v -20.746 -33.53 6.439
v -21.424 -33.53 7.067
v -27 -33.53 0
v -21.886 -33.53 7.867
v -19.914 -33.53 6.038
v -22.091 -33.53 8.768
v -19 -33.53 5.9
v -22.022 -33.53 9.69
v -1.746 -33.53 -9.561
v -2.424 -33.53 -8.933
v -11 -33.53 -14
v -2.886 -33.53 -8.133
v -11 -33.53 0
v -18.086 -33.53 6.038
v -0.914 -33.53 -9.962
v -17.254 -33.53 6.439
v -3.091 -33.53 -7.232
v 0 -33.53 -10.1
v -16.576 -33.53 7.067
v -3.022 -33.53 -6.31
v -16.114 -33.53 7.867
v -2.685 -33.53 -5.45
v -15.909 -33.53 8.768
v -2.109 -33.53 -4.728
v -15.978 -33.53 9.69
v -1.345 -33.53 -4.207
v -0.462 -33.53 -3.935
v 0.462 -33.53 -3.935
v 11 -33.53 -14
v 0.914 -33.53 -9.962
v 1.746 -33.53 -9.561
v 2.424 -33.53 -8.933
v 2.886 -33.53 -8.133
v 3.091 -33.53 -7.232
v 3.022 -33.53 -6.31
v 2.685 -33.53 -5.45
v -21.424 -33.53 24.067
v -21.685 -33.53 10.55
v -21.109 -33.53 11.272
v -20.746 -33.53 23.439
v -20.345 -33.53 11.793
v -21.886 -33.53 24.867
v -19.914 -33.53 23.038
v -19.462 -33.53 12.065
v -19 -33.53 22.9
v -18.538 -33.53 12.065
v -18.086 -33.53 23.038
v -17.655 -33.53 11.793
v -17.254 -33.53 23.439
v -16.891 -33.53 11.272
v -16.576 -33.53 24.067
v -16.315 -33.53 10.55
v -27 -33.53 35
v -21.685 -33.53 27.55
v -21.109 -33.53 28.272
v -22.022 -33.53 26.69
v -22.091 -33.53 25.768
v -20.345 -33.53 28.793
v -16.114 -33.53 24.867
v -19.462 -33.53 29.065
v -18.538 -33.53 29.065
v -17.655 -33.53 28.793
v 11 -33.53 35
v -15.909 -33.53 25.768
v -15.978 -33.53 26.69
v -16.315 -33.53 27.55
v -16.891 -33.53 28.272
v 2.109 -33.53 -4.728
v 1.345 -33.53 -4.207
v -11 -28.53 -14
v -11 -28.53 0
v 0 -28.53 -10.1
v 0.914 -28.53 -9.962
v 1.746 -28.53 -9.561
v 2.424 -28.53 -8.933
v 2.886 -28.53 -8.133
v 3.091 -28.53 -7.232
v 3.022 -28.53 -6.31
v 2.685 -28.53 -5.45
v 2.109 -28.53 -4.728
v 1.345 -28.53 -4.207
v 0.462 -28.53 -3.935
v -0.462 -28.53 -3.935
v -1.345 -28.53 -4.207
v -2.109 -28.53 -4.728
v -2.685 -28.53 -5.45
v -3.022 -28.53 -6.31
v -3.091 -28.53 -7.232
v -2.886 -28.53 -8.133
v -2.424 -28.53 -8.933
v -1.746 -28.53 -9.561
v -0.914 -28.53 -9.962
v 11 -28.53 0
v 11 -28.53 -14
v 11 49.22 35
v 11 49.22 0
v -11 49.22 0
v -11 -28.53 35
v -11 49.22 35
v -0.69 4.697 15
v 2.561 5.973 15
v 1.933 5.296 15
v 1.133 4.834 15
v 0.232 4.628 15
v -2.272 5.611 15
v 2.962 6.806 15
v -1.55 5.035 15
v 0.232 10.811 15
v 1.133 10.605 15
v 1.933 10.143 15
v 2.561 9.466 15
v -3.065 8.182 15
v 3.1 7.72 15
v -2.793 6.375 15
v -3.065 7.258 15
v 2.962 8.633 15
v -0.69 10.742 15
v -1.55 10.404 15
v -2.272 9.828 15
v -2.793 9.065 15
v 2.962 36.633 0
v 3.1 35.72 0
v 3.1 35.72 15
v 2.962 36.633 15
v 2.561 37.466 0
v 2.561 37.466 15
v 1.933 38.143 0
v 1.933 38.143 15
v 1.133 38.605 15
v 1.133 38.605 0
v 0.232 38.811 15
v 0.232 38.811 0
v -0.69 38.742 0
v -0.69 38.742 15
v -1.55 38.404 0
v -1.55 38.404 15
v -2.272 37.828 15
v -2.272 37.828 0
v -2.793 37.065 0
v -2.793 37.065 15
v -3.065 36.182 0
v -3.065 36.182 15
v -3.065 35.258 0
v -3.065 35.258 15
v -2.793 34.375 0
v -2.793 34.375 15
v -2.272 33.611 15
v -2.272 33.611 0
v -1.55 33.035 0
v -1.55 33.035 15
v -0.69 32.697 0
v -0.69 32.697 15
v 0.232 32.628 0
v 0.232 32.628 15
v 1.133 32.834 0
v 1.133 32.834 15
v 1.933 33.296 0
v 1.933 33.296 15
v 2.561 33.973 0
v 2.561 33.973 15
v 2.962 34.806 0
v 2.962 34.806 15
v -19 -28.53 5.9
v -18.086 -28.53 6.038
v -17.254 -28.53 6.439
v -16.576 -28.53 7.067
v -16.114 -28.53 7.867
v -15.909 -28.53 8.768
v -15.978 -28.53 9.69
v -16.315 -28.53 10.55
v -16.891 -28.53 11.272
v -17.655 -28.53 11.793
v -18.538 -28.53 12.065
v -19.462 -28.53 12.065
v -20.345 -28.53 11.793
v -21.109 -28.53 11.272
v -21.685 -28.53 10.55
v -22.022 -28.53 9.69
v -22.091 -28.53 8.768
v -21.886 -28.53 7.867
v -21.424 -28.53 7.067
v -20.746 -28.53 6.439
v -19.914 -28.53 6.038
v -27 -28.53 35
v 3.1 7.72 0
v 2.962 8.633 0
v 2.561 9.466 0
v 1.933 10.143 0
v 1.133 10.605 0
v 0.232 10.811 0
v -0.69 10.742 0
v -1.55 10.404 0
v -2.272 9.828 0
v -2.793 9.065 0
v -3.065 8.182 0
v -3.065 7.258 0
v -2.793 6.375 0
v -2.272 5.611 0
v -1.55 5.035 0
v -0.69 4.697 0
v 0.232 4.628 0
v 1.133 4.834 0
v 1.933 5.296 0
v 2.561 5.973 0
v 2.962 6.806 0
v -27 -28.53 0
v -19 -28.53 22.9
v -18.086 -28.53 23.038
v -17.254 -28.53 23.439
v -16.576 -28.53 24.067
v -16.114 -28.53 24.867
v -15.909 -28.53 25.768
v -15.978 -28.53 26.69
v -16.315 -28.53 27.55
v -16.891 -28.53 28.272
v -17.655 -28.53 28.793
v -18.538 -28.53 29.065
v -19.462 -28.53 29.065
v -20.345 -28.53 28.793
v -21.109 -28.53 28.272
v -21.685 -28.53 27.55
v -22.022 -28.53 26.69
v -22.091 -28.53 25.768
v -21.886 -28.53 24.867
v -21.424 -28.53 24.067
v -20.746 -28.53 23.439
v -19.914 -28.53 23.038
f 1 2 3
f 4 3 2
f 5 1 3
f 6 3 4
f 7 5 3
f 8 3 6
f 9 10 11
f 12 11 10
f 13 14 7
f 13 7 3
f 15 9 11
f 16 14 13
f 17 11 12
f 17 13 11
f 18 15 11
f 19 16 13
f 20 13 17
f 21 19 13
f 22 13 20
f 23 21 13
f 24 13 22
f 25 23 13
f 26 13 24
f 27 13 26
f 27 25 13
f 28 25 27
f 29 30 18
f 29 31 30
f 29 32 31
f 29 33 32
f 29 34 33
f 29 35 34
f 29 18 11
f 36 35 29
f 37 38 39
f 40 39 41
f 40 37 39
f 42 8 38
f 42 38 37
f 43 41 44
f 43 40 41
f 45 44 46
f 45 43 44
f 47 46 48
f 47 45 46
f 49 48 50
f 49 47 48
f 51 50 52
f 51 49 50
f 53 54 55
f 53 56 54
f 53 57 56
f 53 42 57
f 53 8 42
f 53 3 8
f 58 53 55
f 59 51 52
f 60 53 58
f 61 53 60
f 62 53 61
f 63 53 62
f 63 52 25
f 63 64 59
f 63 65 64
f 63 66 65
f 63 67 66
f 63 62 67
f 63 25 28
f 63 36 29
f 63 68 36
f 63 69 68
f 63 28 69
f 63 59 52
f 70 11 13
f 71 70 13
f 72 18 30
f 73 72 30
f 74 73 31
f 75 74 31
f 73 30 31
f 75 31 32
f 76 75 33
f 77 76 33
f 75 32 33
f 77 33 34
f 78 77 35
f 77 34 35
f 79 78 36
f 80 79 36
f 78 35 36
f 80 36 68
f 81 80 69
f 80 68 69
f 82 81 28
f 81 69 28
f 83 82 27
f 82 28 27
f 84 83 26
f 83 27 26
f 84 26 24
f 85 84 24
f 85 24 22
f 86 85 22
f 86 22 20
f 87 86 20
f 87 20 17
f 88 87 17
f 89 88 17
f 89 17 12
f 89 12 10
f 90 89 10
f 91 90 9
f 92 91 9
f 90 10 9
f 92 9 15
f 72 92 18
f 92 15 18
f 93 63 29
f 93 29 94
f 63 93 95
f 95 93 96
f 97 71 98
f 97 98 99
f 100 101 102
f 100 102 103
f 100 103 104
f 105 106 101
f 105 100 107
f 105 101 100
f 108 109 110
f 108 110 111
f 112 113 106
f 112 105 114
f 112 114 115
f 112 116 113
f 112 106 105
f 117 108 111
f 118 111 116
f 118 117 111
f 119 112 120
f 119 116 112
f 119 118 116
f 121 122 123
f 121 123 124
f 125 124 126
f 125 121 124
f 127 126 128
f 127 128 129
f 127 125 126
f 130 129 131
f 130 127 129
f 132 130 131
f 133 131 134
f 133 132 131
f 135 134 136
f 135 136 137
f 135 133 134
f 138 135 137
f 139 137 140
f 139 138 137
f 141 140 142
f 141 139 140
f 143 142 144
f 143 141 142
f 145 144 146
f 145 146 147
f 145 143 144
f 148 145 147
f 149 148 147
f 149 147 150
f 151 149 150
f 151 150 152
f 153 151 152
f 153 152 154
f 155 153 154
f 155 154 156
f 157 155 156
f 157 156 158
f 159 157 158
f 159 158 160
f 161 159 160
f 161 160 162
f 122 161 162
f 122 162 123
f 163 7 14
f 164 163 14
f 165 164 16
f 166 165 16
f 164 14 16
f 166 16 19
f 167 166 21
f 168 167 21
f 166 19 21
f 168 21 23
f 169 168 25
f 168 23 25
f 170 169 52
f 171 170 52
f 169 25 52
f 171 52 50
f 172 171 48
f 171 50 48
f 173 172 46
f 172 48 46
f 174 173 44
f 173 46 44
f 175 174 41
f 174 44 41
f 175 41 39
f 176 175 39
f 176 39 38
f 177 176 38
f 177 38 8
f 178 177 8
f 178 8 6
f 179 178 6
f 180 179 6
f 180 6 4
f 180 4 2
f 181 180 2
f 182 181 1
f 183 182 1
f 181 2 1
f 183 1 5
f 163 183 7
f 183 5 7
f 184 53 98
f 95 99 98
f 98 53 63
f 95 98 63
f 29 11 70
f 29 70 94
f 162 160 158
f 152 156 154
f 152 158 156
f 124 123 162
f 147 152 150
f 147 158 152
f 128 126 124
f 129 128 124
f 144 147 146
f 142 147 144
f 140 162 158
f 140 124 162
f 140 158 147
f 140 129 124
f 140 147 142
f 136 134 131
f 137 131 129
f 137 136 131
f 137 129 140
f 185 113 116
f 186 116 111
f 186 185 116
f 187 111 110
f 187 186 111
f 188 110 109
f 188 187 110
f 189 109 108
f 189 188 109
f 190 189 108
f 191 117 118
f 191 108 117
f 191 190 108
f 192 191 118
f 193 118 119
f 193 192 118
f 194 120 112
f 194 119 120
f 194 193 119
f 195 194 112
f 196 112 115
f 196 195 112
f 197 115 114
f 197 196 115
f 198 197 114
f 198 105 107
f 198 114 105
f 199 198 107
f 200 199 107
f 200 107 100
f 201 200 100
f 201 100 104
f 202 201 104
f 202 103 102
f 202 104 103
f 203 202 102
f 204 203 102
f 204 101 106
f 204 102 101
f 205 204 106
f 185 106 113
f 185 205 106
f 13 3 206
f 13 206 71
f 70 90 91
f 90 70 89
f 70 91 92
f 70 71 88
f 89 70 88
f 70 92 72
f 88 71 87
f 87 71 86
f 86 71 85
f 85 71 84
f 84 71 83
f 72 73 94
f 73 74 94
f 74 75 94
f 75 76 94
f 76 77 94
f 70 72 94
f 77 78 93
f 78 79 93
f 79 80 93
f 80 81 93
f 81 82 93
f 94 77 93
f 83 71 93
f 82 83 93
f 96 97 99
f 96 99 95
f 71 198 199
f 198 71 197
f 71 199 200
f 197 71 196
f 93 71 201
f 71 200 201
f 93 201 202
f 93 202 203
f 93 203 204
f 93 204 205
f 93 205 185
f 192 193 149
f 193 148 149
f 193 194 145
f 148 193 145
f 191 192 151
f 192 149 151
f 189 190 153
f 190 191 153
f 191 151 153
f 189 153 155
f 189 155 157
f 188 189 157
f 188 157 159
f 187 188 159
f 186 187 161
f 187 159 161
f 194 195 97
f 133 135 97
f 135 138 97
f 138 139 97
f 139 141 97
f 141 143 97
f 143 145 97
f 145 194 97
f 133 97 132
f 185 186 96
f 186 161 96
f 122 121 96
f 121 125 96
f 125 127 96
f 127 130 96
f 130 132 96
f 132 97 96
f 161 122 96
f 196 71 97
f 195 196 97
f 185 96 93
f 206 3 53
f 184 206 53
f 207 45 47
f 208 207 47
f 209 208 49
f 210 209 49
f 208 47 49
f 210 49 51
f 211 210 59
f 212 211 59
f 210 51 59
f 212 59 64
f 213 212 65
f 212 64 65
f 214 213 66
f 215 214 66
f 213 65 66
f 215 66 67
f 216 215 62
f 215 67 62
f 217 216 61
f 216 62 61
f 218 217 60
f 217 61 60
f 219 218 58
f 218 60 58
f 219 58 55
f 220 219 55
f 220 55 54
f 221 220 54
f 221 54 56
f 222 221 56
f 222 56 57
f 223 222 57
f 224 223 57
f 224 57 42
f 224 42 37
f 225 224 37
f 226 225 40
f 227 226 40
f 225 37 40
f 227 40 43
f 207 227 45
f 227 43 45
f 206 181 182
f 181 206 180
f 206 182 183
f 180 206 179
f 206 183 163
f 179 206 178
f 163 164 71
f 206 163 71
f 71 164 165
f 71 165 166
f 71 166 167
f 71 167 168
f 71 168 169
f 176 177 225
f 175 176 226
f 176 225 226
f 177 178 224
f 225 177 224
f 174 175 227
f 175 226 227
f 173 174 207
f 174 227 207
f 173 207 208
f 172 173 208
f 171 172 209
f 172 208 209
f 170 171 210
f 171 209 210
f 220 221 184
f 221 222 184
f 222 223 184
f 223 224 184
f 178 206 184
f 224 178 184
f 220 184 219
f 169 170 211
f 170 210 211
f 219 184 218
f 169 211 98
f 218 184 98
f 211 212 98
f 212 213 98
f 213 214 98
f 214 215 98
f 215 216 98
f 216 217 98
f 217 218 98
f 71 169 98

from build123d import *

# Parameters (mm, degrees)
SKETCH1_W           = 22
SKETCH1_H           = 82.75
SKETCH1_R           = 3.1
BOSS_EXTRUDE1_DEPTH = 30
SKETCH2_W           = 22
SKETCH2_H           = 82.75
BOSS_EXTRUDE2_DEPTH = 5
SKETCH3_W           = 16
SKETCH3_H           = 35
SKETCH3_R           = 3.1
SKETCH3_W_2         = 22
SKETCH3_H_2         = 14
BOSS_EXTRUDE3_DEPTH = 5
BOSS_EXTRUDE5_START = 15
SKETCH5_R           = 3.1
BOSS_EXTRUDE5_DEPTH = 15


with BuildPart() as part:
    # Sketch1 → Boss-Extrude1 (new body)
    with BuildSketch(Plane.XY):
        with Locations((0, 7.844654309)):
            Rectangle(SKETCH1_W, SKETCH1_H)
        with Locations((0, 35.719654309)):
            Circle(SKETCH1_R, mode=Mode.SUBTRACT)
        with Locations((0, 7.719654309)):
            Circle(SKETCH1_R, mode=Mode.SUBTRACT)
    extrude(amount=BOSS_EXTRUDE1_DEPTH)

    # Sketch2 → Boss-Extrude2 (add)
    with BuildSketch(Plane.XY.offset(30)):
        with Locations((0, 7.844654309)):
            Rectangle(SKETCH2_W, SKETCH2_H)
    extrude(amount=BOSS_EXTRUDE2_DEPTH)

    # Sketch3 → Boss-Extrude3 (add)
    # profile 1 of 2: a face of its own
    with BuildSketch(Plane.XZ.offset(33.530345691)):
        with Locations((-19, 17.5)):
            Rectangle(SKETCH3_W, SKETCH3_H)
        with Locations(Location((-19, 26, 0), (0, 0, 270))):
            Circle(SKETCH3_R, mode=Mode.SUBTRACT)
        with Locations(Location((-19, 9, 0), (0, 0, 270))):
            Circle(SKETCH3_R, mode=Mode.SUBTRACT)
    # profile 2 of 2: a face of its own
    with BuildSketch(Plane.XZ.offset(33.530345691)):
        with Locations((0, -7)):
            Rectangle(SKETCH3_W_2, SKETCH3_H_2)
        with Locations(Location((0, -7, 0), (0, 0, 270))):
            Circle(SKETCH3_R, mode=Mode.SUBTRACT)
    extrude(amount=-BOSS_EXTRUDE3_DEPTH)

    # Sketch5 → Boss-Extrude5 (add)
    with BuildSketch(Plane(origin=(0, 0, 30), x_dir=(-1, 0, 0), z_dir=(0, 0, -1)).offset(BOSS_EXTRUDE5_START)):
        with Locations((0, 7.719654309)):
            Circle(SKETCH5_R)
        with Locations((0, 35.719654309)):
            Circle(SKETCH5_R)
    extrude(amount=-BOSS_EXTRUDE5_DEPTH)


solid = part.part
